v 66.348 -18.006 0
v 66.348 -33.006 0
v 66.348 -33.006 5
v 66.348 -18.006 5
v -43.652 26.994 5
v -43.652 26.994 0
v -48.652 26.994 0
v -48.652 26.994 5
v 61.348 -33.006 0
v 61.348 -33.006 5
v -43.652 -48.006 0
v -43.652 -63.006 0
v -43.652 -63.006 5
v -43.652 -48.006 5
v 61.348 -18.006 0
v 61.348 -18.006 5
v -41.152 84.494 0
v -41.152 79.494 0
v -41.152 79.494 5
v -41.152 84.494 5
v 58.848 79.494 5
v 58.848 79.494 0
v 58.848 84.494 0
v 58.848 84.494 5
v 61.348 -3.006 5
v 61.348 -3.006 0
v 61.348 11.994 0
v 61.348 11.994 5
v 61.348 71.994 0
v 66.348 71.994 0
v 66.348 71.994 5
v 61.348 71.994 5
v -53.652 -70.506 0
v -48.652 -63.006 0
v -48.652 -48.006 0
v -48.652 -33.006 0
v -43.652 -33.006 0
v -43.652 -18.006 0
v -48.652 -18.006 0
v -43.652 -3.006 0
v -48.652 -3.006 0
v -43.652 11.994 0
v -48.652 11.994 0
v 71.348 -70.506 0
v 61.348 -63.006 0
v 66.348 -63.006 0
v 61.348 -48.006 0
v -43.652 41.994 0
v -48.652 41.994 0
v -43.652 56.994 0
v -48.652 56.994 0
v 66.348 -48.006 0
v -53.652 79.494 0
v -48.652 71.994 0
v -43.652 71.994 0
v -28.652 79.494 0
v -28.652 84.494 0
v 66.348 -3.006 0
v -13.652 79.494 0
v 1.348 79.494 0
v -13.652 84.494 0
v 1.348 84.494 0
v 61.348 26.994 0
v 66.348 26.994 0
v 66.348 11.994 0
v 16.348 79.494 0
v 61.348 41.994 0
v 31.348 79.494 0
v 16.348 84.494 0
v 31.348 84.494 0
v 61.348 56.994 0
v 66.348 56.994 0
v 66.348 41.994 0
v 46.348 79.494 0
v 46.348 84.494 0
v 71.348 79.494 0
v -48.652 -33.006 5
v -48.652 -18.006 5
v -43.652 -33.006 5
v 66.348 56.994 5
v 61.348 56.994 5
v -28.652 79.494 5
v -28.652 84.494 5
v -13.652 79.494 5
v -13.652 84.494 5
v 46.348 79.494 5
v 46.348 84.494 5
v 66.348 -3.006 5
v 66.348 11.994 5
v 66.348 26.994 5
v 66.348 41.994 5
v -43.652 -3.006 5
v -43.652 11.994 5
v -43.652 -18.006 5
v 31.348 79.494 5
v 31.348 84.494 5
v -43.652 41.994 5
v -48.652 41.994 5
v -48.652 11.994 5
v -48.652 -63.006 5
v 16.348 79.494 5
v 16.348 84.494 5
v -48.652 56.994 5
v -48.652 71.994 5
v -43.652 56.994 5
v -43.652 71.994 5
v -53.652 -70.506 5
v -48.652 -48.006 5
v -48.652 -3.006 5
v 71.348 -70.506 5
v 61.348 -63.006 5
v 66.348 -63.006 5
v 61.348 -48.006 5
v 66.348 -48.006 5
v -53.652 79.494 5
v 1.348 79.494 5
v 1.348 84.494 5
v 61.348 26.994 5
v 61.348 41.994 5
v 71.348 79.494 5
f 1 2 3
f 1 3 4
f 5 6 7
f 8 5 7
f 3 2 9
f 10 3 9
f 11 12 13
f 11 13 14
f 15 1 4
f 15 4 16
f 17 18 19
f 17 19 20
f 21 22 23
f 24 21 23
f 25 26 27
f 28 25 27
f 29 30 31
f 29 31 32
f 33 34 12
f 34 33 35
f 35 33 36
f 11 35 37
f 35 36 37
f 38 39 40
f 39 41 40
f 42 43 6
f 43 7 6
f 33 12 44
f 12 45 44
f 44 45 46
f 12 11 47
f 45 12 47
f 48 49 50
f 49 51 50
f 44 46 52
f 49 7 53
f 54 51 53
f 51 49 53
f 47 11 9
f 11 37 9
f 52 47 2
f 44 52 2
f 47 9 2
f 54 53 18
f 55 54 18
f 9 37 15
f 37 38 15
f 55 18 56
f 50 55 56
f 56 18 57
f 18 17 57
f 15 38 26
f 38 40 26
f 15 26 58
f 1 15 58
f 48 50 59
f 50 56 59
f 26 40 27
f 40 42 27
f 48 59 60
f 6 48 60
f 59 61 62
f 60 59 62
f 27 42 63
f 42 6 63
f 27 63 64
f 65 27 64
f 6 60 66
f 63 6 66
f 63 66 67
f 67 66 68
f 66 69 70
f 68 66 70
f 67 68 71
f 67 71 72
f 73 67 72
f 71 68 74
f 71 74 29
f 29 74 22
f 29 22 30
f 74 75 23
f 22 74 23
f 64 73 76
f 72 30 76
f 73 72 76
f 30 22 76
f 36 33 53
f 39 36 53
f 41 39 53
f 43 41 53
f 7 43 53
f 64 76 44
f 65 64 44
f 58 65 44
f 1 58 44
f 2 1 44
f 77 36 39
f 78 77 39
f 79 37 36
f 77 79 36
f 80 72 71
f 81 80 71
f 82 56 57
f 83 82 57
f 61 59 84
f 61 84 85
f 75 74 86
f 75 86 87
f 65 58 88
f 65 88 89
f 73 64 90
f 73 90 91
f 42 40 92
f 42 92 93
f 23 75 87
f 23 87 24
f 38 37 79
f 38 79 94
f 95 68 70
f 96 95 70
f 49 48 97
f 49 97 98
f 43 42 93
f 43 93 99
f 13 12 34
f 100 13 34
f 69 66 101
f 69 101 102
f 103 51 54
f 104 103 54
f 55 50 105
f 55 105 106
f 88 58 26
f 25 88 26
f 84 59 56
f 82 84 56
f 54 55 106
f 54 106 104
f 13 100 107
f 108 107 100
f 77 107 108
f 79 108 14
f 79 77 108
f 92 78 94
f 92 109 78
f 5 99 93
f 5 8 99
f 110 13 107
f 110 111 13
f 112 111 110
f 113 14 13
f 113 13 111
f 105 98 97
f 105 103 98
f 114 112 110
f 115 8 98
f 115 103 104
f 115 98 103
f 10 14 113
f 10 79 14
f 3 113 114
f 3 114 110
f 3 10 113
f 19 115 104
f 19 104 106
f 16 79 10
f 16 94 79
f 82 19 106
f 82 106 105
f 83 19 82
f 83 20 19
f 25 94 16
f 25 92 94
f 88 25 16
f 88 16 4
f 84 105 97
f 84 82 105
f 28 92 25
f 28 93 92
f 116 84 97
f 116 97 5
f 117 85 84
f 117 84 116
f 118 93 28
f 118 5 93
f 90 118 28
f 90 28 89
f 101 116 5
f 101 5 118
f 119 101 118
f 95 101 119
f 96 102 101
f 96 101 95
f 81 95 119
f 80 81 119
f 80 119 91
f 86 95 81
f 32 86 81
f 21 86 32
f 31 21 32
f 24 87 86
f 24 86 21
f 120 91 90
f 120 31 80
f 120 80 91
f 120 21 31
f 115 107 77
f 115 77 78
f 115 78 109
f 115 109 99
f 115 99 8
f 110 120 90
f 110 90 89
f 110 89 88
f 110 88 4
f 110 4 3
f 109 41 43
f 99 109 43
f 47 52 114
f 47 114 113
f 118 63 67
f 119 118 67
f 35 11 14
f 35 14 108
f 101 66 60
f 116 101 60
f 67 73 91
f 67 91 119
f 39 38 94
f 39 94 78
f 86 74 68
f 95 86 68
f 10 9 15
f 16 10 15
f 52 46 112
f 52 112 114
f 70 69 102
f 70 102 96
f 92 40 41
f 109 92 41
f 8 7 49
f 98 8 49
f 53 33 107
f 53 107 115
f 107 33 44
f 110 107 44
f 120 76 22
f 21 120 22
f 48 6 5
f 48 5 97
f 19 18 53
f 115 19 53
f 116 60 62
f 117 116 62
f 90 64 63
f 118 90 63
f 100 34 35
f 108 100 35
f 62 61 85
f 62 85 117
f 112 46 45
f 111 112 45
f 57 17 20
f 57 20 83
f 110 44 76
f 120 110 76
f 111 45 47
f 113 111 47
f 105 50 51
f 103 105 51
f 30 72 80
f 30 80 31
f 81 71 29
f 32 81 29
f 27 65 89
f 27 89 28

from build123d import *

# Parameters (mm, degrees)
ESQUISSE1_W             = 125
ESQUISSE1_H             = 155
BOSS_EXTRU_2_DEPTH      = 5
ESQUISSE3_W             = 5
ESQUISSE3_H             = 15
ENL_V_MAT_EXTRU_1_DEPTH = 5
ESQUISSE4_W             = 15
ESQUISSE4_H             = 5
ESQUISSE4_W_2           = 12.5
ENL_V_MAT_EXTRU_2_DEPTH = 50


with BuildPart() as part:
    # Esquisse1 → Boss.-Extru.2 (new body)
    with BuildSketch(Plane.XY):
        with Locations((8.848314607, 6.994382022)):
            Rectangle(ESQUISSE1_W, ESQUISSE1_H)
    extrude(amount=BOSS_EXTRU_2_DEPTH)

    # Esquisse3 → Enlèv. mat.-Extru.1 (cut)
    with BuildSketch(Plane(origin=(0, 0, 0), x_dir=(-1, 0, 0), z_dir=(0, 0, -1))):
        with Locations((-63.848314607, -55.505617978)):
            Rectangle(ESQUISSE3_W, ESQUISSE3_H)
        with Locations((-63.848314607, -25.505617978)):
            Rectangle(ESQUISSE3_W, ESQUISSE3_H)
        with Locations((-63.848314607, 4.494382022)):
            Rectangle(ESQUISSE3_W, ESQUISSE3_H)
        with Locations((-63.848314607, 34.494382022)):
            Rectangle(ESQUISSE3_W, ESQUISSE3_H)
        with Locations((-63.848314607, 64.494382022)):
            Rectangle(ESQUISSE3_W, ESQUISSE3_H)
        with Locations((46.151685393, -55.505617978)):
            Rectangle(ESQUISSE3_W, ESQUISSE3_H)
        with Locations((46.151685393, 34.494382022)):
            Rectangle(ESQUISSE3_W, ESQUISSE3_H)
        with Locations((46.151685393, -25.505617978)):
            Rectangle(ESQUISSE3_W, ESQUISSE3_H)
        with Locations((46.151685393, 4.494382022)):
            Rectangle(ESQUISSE3_W, ESQUISSE3_H)
        with Locations((46.151685393, 64.494382022)):
            Rectangle(ESQUISSE3_W, ESQUISSE3_H)
    extrude(amount=-ENL_V_MAT_EXTRU_1_DEPTH, mode=Mode.SUBTRACT)

    # Esquisse4 → Enlèv. mat.-Extru.2 (cut)
    with BuildSketch(Plane(origin=(0, 0, 0), x_dir=(-1, 0, 0), z_dir=(0, 0, -1))):
        with Locations((-38.848314607, 81.994382022)):
            Rectangle(ESQUISSE4_W, ESQUISSE4_H)
        with Locations((-65.098314607, 81.994382022)):
            Rectangle(ESQUISSE4_W_2, ESQUISSE4_H)
        with Locations((-8.848314607, 81.994382022)):
            Rectangle(ESQUISSE4_W, ESQUISSE4_H)
        with Locations((21.151685393, 81.994382022)):
            Rectangle(ESQUISSE4_W, ESQUISSE4_H)
        with Locations((47.401685393, 81.994382022)):
            Rectangle(ESQUISSE4_W_2, ESQUISSE4_H)
    extrude(amount=-ENL_V_MAT_EXTRU_2_DEPTH, mode=Mode.SUBTRACT)


solid = part.part
